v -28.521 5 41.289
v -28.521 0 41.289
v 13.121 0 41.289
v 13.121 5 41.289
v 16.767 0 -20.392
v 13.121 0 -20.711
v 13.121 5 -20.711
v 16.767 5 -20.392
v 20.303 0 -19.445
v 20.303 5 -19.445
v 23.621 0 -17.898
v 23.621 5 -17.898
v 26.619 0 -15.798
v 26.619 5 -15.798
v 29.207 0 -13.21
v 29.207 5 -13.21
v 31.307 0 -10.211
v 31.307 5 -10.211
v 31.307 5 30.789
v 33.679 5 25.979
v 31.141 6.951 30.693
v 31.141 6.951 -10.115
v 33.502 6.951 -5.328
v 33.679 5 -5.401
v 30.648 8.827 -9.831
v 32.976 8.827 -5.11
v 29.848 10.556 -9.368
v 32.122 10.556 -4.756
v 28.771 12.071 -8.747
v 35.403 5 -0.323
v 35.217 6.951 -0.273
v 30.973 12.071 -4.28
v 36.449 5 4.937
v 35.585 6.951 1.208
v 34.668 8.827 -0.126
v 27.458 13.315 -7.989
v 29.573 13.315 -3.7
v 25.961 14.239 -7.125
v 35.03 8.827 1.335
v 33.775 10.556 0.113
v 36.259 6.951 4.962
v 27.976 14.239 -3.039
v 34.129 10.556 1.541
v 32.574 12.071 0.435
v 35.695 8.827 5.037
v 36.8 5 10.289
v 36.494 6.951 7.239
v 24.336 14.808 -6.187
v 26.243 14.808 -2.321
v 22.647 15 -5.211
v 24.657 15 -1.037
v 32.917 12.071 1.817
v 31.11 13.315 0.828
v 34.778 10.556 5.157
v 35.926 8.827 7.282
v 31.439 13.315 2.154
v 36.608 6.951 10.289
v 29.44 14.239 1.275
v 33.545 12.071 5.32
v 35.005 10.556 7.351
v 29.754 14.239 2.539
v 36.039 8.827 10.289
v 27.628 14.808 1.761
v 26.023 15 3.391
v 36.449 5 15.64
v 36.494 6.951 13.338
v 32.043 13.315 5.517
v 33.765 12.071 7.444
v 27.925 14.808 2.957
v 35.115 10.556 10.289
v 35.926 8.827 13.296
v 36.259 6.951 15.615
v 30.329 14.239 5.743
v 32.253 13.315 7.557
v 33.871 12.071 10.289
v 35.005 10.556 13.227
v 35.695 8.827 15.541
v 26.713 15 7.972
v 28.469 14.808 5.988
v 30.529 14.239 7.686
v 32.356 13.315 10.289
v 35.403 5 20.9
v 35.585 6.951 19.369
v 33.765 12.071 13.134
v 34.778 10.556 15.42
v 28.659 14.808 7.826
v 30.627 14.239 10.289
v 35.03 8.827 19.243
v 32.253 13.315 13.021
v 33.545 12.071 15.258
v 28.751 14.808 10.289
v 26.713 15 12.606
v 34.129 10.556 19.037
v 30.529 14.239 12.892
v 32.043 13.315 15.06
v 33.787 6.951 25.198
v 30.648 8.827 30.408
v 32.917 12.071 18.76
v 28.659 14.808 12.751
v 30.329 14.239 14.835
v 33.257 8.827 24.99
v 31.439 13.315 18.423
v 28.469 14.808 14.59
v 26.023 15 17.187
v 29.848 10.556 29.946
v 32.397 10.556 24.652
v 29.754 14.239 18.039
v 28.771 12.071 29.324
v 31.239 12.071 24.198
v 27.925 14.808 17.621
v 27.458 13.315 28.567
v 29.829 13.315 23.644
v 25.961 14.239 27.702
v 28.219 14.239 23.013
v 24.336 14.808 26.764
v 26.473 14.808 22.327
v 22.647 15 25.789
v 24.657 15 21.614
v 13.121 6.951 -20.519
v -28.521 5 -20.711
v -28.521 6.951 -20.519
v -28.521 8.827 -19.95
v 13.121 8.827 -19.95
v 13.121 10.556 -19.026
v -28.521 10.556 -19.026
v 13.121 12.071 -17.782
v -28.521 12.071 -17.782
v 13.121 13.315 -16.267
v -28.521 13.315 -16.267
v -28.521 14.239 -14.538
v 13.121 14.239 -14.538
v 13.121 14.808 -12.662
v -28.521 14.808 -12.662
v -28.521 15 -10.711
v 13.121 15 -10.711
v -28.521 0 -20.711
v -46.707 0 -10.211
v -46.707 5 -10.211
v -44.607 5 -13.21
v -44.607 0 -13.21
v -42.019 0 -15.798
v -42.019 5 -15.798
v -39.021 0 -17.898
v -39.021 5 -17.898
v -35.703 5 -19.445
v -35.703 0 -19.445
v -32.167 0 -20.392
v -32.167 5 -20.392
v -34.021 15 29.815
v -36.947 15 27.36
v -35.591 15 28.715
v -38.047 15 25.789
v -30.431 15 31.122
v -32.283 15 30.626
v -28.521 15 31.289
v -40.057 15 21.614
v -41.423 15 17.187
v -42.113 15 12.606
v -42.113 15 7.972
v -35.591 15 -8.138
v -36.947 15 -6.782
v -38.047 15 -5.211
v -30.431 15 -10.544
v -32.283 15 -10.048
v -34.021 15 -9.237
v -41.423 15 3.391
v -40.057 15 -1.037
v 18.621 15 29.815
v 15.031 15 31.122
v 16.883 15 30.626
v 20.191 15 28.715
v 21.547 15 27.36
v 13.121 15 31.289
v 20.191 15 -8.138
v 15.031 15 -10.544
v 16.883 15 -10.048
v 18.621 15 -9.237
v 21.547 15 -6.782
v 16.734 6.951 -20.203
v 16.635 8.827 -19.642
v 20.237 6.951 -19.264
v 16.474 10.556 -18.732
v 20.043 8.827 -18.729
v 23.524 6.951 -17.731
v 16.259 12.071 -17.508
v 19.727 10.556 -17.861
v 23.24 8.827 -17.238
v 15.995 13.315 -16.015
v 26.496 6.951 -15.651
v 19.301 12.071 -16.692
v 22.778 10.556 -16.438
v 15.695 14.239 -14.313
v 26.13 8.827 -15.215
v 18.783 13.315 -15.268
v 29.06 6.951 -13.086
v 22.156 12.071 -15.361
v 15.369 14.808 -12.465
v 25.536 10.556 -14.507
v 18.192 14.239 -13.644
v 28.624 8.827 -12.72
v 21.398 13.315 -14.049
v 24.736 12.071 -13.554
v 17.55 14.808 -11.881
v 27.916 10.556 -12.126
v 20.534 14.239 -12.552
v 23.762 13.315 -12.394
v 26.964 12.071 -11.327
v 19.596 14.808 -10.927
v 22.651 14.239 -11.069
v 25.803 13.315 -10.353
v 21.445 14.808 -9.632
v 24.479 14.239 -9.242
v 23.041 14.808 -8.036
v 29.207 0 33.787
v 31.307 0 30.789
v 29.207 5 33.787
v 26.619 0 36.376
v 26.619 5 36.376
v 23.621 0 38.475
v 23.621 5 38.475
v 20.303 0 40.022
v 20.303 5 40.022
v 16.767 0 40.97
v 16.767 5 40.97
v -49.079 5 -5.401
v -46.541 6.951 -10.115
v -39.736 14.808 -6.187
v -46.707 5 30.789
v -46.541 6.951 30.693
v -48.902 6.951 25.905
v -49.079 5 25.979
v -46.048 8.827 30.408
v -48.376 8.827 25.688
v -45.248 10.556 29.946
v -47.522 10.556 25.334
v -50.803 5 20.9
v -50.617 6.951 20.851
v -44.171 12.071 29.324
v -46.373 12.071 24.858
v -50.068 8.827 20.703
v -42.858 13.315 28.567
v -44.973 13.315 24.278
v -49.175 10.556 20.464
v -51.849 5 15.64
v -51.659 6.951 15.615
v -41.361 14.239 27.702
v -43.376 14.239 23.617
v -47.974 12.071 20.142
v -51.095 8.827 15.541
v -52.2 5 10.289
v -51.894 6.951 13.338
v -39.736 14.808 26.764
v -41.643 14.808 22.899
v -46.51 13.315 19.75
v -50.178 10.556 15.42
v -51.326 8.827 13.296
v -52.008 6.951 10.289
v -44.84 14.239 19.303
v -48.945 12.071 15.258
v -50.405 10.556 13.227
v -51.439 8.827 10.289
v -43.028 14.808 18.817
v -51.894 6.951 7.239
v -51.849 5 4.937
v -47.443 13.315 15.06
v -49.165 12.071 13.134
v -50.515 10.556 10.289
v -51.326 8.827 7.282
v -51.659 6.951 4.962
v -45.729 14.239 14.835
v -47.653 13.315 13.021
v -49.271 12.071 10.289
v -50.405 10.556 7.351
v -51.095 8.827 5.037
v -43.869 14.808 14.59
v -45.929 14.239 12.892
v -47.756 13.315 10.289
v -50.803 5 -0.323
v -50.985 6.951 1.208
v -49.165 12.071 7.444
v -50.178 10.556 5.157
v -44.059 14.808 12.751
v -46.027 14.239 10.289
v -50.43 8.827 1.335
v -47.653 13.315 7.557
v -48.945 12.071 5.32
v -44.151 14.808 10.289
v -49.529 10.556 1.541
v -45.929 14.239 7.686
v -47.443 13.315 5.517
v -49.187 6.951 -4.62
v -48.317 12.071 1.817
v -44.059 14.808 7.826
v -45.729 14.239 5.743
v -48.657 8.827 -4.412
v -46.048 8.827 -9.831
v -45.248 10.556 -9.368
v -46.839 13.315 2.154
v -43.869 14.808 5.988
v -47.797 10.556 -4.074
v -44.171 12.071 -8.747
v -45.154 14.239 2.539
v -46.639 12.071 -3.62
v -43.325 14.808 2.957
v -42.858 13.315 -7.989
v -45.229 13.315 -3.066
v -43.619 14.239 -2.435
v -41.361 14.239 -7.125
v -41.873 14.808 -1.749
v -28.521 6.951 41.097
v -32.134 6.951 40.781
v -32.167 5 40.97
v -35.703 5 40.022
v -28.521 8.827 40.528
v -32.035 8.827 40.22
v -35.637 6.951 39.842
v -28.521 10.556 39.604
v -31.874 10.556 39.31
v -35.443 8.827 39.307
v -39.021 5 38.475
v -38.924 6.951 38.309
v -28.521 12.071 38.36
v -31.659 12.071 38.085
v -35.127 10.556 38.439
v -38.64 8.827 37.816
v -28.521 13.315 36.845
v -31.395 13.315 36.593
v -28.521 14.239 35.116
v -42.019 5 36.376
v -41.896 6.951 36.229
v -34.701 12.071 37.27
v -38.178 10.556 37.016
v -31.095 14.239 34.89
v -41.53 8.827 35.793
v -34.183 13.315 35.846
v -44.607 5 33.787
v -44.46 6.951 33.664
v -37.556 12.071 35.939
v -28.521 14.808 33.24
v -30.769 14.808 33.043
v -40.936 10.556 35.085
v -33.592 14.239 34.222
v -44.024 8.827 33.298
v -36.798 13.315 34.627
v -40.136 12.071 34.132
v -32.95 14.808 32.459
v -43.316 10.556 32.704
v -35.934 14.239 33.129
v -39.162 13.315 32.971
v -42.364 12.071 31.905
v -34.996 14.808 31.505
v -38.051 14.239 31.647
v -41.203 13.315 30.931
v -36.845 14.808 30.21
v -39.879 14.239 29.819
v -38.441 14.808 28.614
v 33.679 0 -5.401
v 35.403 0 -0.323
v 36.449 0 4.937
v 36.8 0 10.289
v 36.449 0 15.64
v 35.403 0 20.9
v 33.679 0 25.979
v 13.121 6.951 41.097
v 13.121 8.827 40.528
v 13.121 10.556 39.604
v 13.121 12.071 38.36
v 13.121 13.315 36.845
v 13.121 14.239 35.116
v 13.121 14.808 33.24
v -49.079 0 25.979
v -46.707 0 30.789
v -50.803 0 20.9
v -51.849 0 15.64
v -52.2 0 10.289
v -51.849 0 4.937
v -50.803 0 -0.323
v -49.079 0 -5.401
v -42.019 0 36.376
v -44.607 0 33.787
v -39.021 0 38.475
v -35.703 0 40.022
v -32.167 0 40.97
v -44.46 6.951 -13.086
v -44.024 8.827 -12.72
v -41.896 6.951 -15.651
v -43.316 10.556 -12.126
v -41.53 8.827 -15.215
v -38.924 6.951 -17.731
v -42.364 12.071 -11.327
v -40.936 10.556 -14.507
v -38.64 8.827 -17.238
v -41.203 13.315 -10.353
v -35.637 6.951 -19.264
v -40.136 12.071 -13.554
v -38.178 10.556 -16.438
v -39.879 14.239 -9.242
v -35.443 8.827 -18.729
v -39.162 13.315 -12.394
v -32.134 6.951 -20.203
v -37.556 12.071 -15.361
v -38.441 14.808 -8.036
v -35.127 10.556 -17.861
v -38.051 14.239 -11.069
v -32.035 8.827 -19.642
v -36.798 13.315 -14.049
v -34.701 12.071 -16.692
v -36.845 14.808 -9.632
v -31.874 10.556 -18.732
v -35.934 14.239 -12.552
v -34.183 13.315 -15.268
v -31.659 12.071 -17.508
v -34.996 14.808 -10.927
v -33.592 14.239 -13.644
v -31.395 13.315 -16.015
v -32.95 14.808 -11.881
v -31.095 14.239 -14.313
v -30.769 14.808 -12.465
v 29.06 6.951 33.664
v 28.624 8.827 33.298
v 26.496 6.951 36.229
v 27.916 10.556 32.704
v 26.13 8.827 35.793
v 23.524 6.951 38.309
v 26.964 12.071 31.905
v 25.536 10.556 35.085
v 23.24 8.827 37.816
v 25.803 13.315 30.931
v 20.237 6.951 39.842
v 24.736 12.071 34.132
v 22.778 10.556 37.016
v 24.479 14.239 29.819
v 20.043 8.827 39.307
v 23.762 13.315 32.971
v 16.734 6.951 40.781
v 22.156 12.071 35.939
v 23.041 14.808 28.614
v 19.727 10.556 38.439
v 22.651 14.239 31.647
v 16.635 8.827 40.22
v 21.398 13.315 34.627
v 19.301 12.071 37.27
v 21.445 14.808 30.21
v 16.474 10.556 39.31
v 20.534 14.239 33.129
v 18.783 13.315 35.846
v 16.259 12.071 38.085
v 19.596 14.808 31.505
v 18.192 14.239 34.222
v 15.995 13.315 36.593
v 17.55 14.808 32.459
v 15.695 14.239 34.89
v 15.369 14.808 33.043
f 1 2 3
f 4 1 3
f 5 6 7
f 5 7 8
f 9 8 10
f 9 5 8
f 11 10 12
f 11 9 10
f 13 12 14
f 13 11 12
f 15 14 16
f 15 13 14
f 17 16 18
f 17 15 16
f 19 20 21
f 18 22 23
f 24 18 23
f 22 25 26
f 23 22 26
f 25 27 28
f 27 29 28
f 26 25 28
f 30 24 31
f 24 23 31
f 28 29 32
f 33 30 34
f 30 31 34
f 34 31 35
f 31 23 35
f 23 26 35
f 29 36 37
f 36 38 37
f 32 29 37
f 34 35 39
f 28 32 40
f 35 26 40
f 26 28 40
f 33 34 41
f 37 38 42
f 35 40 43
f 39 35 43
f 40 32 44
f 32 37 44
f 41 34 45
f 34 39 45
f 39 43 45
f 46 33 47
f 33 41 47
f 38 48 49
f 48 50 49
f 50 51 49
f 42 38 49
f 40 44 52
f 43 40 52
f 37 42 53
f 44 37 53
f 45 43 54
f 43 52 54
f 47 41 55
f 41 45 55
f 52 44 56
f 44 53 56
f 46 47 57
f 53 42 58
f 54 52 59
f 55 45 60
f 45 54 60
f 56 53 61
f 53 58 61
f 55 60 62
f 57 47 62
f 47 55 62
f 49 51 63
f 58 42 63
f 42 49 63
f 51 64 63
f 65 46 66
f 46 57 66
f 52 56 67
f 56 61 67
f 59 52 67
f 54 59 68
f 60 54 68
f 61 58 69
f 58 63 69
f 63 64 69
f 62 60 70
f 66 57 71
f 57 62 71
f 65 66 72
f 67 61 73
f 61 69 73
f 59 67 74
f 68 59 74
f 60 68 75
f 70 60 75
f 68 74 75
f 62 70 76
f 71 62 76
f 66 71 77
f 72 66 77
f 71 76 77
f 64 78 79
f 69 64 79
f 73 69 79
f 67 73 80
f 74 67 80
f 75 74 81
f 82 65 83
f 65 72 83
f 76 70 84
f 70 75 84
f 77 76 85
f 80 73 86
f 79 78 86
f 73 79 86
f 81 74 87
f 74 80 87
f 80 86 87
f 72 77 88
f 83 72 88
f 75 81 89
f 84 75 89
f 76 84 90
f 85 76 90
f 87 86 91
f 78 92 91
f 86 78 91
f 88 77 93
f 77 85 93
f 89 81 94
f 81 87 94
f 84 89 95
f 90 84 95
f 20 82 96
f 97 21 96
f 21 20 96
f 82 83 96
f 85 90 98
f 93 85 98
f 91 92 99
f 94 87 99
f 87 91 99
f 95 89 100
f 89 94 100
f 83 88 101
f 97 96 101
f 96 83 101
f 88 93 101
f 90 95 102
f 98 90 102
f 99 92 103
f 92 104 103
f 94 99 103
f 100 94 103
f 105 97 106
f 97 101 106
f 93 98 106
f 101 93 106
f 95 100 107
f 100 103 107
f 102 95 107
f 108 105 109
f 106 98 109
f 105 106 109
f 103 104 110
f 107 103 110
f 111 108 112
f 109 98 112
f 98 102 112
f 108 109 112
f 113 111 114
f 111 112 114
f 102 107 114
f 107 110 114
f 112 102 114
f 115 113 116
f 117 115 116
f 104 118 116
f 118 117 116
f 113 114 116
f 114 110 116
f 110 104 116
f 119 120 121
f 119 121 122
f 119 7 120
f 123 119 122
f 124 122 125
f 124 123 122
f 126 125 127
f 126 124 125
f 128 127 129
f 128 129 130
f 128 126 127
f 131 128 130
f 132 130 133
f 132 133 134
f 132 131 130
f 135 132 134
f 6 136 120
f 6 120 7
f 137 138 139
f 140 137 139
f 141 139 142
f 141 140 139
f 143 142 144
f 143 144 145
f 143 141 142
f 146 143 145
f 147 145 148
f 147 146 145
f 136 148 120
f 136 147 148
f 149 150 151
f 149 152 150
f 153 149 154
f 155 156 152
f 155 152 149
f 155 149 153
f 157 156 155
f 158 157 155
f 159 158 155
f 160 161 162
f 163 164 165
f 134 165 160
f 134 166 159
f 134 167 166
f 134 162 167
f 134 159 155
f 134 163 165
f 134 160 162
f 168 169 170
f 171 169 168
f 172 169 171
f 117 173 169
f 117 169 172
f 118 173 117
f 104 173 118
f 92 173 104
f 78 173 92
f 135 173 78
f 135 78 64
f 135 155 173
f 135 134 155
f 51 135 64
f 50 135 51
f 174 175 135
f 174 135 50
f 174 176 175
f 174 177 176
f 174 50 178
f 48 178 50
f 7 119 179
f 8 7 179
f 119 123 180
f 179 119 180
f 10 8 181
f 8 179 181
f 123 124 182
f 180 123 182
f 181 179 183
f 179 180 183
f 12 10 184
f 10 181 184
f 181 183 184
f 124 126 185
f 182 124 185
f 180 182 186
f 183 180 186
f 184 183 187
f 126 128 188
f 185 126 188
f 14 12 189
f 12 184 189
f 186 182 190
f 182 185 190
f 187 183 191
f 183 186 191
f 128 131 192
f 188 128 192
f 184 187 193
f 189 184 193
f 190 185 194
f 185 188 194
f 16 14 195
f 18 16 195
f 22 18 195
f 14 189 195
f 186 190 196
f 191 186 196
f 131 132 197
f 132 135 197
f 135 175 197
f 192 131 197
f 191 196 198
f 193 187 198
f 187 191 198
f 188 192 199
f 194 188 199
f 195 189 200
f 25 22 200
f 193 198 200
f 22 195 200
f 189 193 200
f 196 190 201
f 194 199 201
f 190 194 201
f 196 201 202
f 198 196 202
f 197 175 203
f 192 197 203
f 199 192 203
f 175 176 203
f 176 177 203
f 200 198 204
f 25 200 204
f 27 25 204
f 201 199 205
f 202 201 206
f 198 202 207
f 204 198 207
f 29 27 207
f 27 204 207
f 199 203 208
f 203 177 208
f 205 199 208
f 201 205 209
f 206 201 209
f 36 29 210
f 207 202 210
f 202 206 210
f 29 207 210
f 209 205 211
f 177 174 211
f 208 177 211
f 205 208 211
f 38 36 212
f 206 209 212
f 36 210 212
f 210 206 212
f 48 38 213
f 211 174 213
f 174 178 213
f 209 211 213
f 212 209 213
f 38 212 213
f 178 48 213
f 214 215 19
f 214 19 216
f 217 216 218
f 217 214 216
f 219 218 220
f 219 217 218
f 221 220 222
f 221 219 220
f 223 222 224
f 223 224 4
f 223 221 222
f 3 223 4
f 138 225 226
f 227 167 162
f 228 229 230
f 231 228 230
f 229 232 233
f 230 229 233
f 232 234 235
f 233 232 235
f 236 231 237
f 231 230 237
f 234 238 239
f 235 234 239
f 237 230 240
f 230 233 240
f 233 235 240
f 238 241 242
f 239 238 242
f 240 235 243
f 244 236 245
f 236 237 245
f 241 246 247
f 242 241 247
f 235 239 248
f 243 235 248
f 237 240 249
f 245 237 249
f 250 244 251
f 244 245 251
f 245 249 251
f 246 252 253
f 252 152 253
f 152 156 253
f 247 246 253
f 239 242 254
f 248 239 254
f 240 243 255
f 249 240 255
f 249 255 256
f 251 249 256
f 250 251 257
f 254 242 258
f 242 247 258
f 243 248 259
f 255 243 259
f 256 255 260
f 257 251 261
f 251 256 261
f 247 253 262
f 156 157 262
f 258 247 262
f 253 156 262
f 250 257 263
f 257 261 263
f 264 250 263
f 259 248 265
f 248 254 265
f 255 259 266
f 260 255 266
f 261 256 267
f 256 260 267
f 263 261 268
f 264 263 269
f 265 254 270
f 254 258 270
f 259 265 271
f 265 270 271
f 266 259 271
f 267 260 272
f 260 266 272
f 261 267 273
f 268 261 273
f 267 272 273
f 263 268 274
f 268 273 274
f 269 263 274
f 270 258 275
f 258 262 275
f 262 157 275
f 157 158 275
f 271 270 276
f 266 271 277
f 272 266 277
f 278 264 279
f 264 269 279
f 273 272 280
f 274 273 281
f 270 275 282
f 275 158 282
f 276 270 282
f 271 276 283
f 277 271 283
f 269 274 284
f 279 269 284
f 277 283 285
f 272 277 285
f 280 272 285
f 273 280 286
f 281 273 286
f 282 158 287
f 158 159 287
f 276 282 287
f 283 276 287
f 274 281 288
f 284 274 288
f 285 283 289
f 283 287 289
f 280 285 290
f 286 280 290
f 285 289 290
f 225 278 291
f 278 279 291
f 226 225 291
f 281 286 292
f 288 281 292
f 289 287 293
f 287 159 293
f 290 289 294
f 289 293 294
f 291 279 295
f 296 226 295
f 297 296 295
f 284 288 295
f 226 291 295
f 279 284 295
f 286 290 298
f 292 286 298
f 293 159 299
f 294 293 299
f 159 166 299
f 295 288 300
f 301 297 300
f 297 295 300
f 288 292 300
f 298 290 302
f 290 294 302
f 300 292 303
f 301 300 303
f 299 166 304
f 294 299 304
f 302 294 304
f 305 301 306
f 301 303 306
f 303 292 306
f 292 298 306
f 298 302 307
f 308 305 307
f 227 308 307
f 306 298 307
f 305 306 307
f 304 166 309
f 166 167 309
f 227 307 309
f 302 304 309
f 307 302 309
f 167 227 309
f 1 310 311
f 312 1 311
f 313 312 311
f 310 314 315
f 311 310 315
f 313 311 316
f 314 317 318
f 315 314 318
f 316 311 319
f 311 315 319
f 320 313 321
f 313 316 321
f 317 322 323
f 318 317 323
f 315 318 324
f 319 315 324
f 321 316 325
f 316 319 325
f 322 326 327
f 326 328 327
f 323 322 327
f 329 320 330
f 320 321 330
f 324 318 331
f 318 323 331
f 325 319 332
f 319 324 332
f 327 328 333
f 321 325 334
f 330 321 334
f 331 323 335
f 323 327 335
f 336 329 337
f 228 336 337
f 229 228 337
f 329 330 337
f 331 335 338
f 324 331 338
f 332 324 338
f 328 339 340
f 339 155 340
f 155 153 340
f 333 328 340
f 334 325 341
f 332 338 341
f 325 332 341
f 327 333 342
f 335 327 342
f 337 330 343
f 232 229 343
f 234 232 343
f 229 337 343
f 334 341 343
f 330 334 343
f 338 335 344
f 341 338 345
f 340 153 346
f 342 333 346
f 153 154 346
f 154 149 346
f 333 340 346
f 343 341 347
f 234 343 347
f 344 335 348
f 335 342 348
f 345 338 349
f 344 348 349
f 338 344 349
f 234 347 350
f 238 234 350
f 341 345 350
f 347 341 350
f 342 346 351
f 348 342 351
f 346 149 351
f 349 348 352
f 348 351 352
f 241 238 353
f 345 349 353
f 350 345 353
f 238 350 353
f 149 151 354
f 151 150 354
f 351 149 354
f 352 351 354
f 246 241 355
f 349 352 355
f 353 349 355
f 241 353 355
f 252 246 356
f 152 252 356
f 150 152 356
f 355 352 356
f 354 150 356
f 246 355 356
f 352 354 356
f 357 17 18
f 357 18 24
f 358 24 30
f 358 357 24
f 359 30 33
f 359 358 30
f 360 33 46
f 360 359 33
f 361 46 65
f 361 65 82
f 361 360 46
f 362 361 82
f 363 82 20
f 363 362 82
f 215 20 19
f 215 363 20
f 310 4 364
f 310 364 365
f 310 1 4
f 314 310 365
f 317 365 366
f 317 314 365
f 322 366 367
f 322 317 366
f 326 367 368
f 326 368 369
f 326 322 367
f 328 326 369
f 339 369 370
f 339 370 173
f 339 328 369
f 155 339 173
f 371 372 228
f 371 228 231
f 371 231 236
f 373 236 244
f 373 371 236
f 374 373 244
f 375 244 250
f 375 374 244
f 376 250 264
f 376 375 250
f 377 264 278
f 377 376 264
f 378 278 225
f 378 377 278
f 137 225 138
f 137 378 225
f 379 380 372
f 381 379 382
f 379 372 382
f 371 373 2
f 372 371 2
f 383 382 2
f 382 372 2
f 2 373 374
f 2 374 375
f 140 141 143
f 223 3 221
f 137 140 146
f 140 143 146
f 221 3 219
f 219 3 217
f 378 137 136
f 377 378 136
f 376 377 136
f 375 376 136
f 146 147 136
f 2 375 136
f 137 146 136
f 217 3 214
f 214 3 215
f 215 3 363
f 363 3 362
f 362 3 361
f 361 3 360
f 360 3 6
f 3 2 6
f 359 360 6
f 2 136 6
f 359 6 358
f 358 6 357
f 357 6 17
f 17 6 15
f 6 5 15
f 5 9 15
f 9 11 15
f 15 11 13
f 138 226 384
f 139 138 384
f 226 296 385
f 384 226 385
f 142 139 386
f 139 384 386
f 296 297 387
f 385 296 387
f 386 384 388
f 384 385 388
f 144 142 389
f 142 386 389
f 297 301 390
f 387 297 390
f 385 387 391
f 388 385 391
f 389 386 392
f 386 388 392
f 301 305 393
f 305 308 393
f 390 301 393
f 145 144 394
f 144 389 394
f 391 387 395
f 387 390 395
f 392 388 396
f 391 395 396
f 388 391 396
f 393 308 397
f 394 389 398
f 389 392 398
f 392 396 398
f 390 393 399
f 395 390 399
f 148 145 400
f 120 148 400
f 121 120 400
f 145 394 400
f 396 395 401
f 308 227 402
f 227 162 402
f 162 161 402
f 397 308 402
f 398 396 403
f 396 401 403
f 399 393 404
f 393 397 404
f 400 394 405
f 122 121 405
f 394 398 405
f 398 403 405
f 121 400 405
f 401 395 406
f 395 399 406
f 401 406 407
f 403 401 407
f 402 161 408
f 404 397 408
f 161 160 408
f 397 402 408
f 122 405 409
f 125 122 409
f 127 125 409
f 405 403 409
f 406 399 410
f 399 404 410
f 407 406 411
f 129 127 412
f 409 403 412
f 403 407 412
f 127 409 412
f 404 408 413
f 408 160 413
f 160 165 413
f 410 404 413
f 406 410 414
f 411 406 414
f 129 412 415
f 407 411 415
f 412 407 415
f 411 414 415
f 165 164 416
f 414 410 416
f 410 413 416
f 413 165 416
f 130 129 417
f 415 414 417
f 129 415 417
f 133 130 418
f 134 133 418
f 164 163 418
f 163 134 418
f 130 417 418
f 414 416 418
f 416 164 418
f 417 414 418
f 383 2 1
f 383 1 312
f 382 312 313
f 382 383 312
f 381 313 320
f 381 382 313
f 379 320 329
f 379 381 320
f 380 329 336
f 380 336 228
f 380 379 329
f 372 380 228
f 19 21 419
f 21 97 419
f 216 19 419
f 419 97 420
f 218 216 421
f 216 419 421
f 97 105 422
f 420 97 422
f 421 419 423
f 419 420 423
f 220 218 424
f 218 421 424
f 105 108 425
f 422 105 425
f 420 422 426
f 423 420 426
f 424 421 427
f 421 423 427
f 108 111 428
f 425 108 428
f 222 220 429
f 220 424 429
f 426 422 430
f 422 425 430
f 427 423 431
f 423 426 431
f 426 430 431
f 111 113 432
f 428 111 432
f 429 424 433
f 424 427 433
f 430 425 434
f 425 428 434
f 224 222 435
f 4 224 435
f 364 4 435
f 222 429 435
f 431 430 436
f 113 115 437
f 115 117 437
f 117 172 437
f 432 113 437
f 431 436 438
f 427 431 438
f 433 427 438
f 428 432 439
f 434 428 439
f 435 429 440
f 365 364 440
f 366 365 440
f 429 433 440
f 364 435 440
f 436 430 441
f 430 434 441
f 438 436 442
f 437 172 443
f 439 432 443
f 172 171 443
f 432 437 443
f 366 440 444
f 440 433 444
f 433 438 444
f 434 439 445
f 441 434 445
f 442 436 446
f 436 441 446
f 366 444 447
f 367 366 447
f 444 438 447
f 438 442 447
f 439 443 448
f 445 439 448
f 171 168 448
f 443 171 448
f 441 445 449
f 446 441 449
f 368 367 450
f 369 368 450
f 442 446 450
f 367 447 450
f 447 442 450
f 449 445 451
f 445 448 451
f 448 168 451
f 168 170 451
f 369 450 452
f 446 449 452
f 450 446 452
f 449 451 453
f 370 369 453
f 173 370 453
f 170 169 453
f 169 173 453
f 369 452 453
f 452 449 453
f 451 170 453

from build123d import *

# Parameters (mm, degrees)
SKETCH_1_W          = 89
SKETCH_1_H          = 62
EXTRUDE_1_DEPTH     = 15
CUT_EXTRUDE_START   = -15.000001
SKETCH_2_W          = 114.345269922
SKETCH_2_H          = 82.741202996
CUT_EXTRUDE_2_DEPTH = 15.000002
FILLET_1_R          = 10


with BuildPart() as part:
    # 草图1 → 凸台-拉伸1 (new body)
    with BuildSketch(Plane(origin=(0, 0, 0), x_dir=(1, 0, 0), z_dir=(0, 1, 0))):
        with Locations((-7.7, -10.288888889)):
            Rectangle(SKETCH_1_W, SKETCH_1_H)
    extrude(amount=EXTRUDE_1_DEPTH)

    # 草图2 → 切除-拉伸2 (cut)
    with BuildSketch(Plane(origin=(0, 15, 0), x_dir=(1, 0, 0), z_dir=(0, 1, 0)).offset(CUT_EXTRUDE_START)):
        with Locations((-11.341983823, -7.488413354)):
            Rectangle(SKETCH_2_W, SKETCH_2_H)
        with BuildLine():
            Line((-28.520508076, 20.711111111), (13.120508076, 20.711111111))
            ThreePointArc((13.120508076, 20.711111111), (23.620508076, 17.897644591), (31.307041555, 10.211111111))
            ThreePointArc((31.307041555, 10.211111111), (36.8, -10.288888889), (31.307041555, -30.788888889))
            ThreePointArc((31.307041555, -30.788888889), (23.620508076, -38.475422368), (13.120508076, -41.288888889))
            Line((13.120508076, -41.288888889), (-28.520508076, -41.288888889))
            ThreePointArc((-28.520508076, -41.288888889), (-39.020508076, -38.475422368), (-46.707041555, -30.788888889))
            ThreePointArc((-46.707041555, -30.788888889), (-52.2, -10.288888889), (-46.707041555, 10.211111111))
            ThreePointArc((-46.707041555, 10.211111111), (-39.020508076, 17.897644591), (-28.520508076, 20.711111111))
        make_face(mode=Mode.SUBTRACT)
    extrude(amount=CUT_EXTRUDE_2_DEPTH, mode=Mode.SUBTRACT)

    # 圆角1
    fillet_1_edges = [part.edges().sort_by_distance(p)[0] for p in [
        (23.620508076, 15, 38.475422368),
        (36.8, 15, 10.288888889),
        (-52.2, 15, 10.288888889),
        (-39.020508076, 15, -17.897644591),
        (-7.7, 15, 41.288888889),
        (-39.020508076, 15, 38.475422368),
        (-7.7, 15, -20.711111111),
        (23.620508076, 15, -17.897644591),
    ]]
    fillet(fillet_1_edges, radius=FILLET_1_R)


solid = part.part
